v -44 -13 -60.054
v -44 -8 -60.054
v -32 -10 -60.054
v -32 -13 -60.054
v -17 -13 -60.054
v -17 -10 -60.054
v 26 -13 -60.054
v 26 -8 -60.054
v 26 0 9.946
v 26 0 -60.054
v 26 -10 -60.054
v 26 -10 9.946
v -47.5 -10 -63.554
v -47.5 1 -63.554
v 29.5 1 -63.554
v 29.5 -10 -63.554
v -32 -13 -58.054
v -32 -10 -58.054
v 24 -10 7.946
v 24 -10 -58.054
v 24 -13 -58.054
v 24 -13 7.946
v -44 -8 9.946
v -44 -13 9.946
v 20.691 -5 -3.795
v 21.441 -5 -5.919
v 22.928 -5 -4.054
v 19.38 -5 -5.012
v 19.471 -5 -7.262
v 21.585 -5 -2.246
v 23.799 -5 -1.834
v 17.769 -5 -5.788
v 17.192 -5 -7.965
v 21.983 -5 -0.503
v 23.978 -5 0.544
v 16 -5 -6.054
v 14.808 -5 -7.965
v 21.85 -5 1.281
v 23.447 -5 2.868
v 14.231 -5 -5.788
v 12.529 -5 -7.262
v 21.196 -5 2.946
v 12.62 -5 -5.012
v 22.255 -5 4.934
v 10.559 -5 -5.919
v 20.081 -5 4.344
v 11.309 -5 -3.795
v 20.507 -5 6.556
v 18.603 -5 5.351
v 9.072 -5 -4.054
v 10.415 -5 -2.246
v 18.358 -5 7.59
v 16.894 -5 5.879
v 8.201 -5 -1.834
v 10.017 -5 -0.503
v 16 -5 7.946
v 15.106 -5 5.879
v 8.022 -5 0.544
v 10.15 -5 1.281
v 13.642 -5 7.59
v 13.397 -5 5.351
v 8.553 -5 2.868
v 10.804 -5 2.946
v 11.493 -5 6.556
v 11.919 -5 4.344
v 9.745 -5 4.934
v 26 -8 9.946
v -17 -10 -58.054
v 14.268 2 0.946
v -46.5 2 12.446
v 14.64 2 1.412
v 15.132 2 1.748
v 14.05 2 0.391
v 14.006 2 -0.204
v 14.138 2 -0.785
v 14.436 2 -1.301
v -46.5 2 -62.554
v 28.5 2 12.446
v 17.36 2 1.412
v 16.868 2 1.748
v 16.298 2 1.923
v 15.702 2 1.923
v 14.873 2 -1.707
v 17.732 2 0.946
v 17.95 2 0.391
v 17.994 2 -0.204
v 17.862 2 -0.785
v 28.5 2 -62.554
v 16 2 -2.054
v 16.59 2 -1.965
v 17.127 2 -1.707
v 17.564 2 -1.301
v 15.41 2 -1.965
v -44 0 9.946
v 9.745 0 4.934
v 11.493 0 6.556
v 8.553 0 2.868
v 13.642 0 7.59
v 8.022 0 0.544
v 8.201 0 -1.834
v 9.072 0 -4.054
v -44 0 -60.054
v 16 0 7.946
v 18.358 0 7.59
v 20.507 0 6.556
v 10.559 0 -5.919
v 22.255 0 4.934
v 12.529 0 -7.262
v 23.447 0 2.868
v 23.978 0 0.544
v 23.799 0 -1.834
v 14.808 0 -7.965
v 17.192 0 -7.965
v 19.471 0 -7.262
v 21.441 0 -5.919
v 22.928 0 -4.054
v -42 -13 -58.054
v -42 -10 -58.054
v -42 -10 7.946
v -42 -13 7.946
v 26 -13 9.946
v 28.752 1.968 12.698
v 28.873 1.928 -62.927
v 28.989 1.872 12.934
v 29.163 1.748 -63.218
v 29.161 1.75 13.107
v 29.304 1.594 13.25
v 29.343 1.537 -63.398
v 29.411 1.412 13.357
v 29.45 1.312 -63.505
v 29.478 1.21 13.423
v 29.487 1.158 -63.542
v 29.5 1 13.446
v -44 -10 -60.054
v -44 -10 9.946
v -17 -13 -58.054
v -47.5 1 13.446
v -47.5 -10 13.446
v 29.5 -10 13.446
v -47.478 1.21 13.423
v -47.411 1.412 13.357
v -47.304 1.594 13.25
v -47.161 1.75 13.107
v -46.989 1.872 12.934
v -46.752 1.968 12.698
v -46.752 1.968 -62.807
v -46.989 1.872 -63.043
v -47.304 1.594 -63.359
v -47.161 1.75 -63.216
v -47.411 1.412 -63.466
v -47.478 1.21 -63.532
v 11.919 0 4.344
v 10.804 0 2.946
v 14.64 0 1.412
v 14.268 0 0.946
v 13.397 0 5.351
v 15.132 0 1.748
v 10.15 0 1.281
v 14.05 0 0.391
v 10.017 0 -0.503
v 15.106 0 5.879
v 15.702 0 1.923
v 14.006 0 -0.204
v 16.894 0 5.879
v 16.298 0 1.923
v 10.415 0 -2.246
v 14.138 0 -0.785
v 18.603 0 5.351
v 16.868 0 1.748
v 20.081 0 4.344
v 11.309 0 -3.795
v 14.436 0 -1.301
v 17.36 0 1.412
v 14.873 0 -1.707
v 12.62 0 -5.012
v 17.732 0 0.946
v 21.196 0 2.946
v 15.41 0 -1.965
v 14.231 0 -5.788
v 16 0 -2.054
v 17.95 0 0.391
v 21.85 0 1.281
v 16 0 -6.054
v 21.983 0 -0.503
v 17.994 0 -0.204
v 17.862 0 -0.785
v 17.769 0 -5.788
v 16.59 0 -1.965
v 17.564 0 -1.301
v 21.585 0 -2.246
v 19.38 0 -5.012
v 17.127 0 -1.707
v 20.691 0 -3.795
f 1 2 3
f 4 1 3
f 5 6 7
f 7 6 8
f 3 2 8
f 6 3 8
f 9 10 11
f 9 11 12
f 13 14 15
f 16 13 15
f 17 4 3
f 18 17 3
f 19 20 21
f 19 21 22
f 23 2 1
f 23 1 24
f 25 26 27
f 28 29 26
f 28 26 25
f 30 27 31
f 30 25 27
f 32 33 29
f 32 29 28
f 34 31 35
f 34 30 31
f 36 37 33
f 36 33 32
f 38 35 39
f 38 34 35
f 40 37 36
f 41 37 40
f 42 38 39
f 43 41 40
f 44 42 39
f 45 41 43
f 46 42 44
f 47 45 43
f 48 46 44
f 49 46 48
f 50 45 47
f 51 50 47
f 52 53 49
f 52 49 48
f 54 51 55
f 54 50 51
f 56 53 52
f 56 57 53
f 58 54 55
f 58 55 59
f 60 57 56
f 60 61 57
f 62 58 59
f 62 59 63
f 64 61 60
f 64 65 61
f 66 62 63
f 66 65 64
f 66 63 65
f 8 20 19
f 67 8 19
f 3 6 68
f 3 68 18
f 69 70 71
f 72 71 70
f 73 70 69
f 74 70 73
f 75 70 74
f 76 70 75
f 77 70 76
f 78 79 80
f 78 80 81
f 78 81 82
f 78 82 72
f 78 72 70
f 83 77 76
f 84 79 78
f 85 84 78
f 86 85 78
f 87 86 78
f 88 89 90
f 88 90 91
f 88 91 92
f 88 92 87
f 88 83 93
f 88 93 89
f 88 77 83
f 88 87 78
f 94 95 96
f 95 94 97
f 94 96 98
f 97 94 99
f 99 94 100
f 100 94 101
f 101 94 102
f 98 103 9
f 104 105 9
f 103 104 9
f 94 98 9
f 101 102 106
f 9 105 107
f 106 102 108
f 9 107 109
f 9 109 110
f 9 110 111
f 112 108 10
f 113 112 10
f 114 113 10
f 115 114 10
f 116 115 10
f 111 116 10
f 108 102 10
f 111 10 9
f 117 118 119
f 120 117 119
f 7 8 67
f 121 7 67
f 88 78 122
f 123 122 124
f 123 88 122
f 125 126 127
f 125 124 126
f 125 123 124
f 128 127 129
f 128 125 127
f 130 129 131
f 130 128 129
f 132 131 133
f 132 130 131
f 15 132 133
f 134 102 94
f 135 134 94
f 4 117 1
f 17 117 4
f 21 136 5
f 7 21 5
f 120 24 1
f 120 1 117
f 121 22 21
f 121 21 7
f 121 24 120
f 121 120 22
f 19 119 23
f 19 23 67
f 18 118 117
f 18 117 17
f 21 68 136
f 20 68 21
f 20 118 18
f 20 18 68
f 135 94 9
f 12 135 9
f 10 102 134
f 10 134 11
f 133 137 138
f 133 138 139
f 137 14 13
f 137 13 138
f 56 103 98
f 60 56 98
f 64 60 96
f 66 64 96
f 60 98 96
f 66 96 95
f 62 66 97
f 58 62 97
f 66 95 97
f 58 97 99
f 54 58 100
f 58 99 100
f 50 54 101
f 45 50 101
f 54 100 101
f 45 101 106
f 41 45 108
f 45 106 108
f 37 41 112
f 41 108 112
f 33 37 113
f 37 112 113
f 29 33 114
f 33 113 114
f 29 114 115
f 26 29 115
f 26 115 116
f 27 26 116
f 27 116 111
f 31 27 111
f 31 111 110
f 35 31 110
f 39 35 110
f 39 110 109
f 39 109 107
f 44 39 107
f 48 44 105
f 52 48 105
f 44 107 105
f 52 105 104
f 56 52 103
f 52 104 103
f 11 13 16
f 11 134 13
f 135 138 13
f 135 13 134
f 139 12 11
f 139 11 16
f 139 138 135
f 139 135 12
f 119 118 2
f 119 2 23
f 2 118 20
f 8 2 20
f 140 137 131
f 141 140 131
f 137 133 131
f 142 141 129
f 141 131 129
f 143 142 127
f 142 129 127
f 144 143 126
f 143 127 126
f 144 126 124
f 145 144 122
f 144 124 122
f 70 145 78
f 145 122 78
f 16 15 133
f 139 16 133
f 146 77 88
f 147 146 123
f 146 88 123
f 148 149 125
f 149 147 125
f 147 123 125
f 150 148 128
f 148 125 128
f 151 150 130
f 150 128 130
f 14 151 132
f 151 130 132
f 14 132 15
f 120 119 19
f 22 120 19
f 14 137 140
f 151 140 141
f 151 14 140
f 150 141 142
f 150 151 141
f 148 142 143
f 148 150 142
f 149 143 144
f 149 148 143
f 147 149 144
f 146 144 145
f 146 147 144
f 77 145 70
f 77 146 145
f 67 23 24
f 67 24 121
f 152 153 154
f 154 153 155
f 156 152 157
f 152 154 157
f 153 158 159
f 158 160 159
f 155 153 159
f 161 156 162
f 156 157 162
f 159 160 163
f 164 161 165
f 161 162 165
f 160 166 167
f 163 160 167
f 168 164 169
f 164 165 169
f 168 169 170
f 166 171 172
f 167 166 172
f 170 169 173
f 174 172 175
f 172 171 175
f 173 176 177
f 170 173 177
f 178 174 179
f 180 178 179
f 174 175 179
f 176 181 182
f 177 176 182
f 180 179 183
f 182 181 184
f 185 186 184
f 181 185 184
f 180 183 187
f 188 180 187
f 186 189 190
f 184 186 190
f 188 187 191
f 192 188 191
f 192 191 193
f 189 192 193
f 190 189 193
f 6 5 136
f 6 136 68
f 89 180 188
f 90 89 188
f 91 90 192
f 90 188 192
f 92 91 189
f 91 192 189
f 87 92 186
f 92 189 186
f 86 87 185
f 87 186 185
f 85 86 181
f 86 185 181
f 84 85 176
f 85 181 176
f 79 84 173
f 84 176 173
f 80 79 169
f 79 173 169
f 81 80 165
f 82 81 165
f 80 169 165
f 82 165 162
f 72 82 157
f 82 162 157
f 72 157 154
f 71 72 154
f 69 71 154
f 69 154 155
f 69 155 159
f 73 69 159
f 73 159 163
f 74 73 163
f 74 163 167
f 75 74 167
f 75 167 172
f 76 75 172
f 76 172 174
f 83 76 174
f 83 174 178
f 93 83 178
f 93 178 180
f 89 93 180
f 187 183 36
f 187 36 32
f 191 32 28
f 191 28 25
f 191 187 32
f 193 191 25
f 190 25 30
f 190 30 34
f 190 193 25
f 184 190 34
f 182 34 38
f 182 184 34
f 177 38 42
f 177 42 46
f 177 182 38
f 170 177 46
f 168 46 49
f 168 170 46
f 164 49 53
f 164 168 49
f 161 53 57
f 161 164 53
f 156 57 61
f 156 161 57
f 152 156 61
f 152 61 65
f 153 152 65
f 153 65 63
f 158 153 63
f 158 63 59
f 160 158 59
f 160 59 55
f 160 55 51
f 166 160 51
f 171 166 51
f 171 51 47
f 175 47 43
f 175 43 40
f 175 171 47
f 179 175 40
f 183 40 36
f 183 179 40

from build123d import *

# Parameters (mm, degrees)
SKETCH1_W           = 77
SKETCH1_H           = 77
BOSS_EXTRUDE1_DEPTH = 2
BOSS_EXTRUDE2_START = 8
SKETCH3_W           = 70
SKETCH3_H           = 70
SKETCH3_W_2         = 66
SKETCH3_H_2         = 66
BOSS_EXTRUDE2_DEPTH = 5
SKETCH5_W           = 77
SKETCH5_H           = 77
SKETCH5_W_2         = 70
SKETCH5_H_2         = 70
BOSS_EXTRUDE3_DEPTH = 10
SKETCH7_W           = 15
SKETCH7_H           = 3
CUT_EXTRUDE2_DEPTH  = 10
CHAMFER1_SIZE       = 2
SKETCH9_R           = 8
SKETCH9_R_2         = 6
BOSS_EXTRUDE6_DEPTH = 5
SKETCH10_R          = 2
CUT_EXTRUDE3_DEPTH  = 5
FILLET1_R           = 1


with BuildPart() as part:
    # Sketch1 → Boss-Extrude1 (new body)
    with BuildSketch(Plane(origin=(0, 0, 0), x_dir=(1, 0, 0), z_dir=(0, 1, 0))):
        with Locations((-9, 25.054332031)):
            Rectangle(SKETCH1_W, SKETCH1_H)
    extrude(amount=BOSS_EXTRUDE1_DEPTH)

    # Sketch5 → Boss-Extrude3 (add)
    with BuildSketch(Plane.XZ):
        with Locations((-9, -25.054332031)):
            Rectangle(SKETCH5_W, SKETCH5_H)
        with Locations((-9, -25.054332031)):
            Rectangle(SKETCH5_W_2, SKETCH5_H_2, mode=Mode.SUBTRACT)
    extrude(amount=BOSS_EXTRUDE3_DEPTH)

    # Sketch9 → Boss-Extrude6 (add)
    with BuildSketch(Plane.XZ):
        with Locations(Location((16, -0.054332031, 0), (0, 0, 90))):
            Circle(SKETCH9_R)
        with Locations(Location((16, -0.054332031, 0), (0, 0, 270))):
            Circle(SKETCH9_R_2, mode=Mode.SUBTRACT)
    extrude(amount=BOSS_EXTRUDE6_DEPTH)

    # Sketch10 → Cut-Extrude3 (cut)
    with BuildSketch(Plane.XZ):
        with Locations(Location((16, -0.054332031, 0), (0, 0, 270))):
            Circle(SKETCH10_R)
    extrude(amount=-CUT_EXTRUDE3_DEPTH, mode=Mode.SUBTRACT)

    # Fillet1
    fillet1_edges = [part.edges().sort_by_distance(p)[0] for p in [
        (-47.5, 2, -25.054332031),
        (-9, 2, 13.445667969),
        (29.5, 2, -25.054332031),
        (-9, 2, -63.554332031),
    ]]
    fillet(fillet1_edges, radius=FILLET1_R)


with BuildPart() as body_2:
    # Sketch3 → Boss-Extrude2 (new body)
    with BuildSketch(Plane.XZ.offset(BOSS_EXTRUDE2_START)):
        with Locations((-9, -25.054332031)):
            Rectangle(SKETCH3_W, SKETCH3_H)
        with Locations((-9, -25.054332031)):
            Rectangle(SKETCH3_W_2, SKETCH3_H_2, mode=Mode.SUBTRACT)
    extrude(amount=BOSS_EXTRUDE2_DEPTH)

    # Sketch7 → Cut-Extrude2 (cut)
    with BuildSketch(Plane(origin=(0, 0, -63.554332031), x_dir=(-1, 0, 0), z_dir=(0, 0, -1))):
        with Locations((24.5, -11.5)):
            Rectangle(SKETCH7_W, SKETCH7_H)
    extrude(amount=-CUT_EXTRUDE2_DEPTH, mode=Mode.SUBTRACT)

    # Chamfer1
    chamfer1_edges = [body_2.edges().sort_by_distance(p)[0] for p in [
        (-42, -8, -25.054332031),
        (-9, -8, -58.054332031),
        (24, -8, -25.054332031),
        (-9, -8, 7.945667969),
    ]]
    chamfer(chamfer1_edges, length=CHAMFER1_SIZE - 0.0001)  # a hair under: the kernel refuses the full size


solid = Compound([part.part, body_2.part])
